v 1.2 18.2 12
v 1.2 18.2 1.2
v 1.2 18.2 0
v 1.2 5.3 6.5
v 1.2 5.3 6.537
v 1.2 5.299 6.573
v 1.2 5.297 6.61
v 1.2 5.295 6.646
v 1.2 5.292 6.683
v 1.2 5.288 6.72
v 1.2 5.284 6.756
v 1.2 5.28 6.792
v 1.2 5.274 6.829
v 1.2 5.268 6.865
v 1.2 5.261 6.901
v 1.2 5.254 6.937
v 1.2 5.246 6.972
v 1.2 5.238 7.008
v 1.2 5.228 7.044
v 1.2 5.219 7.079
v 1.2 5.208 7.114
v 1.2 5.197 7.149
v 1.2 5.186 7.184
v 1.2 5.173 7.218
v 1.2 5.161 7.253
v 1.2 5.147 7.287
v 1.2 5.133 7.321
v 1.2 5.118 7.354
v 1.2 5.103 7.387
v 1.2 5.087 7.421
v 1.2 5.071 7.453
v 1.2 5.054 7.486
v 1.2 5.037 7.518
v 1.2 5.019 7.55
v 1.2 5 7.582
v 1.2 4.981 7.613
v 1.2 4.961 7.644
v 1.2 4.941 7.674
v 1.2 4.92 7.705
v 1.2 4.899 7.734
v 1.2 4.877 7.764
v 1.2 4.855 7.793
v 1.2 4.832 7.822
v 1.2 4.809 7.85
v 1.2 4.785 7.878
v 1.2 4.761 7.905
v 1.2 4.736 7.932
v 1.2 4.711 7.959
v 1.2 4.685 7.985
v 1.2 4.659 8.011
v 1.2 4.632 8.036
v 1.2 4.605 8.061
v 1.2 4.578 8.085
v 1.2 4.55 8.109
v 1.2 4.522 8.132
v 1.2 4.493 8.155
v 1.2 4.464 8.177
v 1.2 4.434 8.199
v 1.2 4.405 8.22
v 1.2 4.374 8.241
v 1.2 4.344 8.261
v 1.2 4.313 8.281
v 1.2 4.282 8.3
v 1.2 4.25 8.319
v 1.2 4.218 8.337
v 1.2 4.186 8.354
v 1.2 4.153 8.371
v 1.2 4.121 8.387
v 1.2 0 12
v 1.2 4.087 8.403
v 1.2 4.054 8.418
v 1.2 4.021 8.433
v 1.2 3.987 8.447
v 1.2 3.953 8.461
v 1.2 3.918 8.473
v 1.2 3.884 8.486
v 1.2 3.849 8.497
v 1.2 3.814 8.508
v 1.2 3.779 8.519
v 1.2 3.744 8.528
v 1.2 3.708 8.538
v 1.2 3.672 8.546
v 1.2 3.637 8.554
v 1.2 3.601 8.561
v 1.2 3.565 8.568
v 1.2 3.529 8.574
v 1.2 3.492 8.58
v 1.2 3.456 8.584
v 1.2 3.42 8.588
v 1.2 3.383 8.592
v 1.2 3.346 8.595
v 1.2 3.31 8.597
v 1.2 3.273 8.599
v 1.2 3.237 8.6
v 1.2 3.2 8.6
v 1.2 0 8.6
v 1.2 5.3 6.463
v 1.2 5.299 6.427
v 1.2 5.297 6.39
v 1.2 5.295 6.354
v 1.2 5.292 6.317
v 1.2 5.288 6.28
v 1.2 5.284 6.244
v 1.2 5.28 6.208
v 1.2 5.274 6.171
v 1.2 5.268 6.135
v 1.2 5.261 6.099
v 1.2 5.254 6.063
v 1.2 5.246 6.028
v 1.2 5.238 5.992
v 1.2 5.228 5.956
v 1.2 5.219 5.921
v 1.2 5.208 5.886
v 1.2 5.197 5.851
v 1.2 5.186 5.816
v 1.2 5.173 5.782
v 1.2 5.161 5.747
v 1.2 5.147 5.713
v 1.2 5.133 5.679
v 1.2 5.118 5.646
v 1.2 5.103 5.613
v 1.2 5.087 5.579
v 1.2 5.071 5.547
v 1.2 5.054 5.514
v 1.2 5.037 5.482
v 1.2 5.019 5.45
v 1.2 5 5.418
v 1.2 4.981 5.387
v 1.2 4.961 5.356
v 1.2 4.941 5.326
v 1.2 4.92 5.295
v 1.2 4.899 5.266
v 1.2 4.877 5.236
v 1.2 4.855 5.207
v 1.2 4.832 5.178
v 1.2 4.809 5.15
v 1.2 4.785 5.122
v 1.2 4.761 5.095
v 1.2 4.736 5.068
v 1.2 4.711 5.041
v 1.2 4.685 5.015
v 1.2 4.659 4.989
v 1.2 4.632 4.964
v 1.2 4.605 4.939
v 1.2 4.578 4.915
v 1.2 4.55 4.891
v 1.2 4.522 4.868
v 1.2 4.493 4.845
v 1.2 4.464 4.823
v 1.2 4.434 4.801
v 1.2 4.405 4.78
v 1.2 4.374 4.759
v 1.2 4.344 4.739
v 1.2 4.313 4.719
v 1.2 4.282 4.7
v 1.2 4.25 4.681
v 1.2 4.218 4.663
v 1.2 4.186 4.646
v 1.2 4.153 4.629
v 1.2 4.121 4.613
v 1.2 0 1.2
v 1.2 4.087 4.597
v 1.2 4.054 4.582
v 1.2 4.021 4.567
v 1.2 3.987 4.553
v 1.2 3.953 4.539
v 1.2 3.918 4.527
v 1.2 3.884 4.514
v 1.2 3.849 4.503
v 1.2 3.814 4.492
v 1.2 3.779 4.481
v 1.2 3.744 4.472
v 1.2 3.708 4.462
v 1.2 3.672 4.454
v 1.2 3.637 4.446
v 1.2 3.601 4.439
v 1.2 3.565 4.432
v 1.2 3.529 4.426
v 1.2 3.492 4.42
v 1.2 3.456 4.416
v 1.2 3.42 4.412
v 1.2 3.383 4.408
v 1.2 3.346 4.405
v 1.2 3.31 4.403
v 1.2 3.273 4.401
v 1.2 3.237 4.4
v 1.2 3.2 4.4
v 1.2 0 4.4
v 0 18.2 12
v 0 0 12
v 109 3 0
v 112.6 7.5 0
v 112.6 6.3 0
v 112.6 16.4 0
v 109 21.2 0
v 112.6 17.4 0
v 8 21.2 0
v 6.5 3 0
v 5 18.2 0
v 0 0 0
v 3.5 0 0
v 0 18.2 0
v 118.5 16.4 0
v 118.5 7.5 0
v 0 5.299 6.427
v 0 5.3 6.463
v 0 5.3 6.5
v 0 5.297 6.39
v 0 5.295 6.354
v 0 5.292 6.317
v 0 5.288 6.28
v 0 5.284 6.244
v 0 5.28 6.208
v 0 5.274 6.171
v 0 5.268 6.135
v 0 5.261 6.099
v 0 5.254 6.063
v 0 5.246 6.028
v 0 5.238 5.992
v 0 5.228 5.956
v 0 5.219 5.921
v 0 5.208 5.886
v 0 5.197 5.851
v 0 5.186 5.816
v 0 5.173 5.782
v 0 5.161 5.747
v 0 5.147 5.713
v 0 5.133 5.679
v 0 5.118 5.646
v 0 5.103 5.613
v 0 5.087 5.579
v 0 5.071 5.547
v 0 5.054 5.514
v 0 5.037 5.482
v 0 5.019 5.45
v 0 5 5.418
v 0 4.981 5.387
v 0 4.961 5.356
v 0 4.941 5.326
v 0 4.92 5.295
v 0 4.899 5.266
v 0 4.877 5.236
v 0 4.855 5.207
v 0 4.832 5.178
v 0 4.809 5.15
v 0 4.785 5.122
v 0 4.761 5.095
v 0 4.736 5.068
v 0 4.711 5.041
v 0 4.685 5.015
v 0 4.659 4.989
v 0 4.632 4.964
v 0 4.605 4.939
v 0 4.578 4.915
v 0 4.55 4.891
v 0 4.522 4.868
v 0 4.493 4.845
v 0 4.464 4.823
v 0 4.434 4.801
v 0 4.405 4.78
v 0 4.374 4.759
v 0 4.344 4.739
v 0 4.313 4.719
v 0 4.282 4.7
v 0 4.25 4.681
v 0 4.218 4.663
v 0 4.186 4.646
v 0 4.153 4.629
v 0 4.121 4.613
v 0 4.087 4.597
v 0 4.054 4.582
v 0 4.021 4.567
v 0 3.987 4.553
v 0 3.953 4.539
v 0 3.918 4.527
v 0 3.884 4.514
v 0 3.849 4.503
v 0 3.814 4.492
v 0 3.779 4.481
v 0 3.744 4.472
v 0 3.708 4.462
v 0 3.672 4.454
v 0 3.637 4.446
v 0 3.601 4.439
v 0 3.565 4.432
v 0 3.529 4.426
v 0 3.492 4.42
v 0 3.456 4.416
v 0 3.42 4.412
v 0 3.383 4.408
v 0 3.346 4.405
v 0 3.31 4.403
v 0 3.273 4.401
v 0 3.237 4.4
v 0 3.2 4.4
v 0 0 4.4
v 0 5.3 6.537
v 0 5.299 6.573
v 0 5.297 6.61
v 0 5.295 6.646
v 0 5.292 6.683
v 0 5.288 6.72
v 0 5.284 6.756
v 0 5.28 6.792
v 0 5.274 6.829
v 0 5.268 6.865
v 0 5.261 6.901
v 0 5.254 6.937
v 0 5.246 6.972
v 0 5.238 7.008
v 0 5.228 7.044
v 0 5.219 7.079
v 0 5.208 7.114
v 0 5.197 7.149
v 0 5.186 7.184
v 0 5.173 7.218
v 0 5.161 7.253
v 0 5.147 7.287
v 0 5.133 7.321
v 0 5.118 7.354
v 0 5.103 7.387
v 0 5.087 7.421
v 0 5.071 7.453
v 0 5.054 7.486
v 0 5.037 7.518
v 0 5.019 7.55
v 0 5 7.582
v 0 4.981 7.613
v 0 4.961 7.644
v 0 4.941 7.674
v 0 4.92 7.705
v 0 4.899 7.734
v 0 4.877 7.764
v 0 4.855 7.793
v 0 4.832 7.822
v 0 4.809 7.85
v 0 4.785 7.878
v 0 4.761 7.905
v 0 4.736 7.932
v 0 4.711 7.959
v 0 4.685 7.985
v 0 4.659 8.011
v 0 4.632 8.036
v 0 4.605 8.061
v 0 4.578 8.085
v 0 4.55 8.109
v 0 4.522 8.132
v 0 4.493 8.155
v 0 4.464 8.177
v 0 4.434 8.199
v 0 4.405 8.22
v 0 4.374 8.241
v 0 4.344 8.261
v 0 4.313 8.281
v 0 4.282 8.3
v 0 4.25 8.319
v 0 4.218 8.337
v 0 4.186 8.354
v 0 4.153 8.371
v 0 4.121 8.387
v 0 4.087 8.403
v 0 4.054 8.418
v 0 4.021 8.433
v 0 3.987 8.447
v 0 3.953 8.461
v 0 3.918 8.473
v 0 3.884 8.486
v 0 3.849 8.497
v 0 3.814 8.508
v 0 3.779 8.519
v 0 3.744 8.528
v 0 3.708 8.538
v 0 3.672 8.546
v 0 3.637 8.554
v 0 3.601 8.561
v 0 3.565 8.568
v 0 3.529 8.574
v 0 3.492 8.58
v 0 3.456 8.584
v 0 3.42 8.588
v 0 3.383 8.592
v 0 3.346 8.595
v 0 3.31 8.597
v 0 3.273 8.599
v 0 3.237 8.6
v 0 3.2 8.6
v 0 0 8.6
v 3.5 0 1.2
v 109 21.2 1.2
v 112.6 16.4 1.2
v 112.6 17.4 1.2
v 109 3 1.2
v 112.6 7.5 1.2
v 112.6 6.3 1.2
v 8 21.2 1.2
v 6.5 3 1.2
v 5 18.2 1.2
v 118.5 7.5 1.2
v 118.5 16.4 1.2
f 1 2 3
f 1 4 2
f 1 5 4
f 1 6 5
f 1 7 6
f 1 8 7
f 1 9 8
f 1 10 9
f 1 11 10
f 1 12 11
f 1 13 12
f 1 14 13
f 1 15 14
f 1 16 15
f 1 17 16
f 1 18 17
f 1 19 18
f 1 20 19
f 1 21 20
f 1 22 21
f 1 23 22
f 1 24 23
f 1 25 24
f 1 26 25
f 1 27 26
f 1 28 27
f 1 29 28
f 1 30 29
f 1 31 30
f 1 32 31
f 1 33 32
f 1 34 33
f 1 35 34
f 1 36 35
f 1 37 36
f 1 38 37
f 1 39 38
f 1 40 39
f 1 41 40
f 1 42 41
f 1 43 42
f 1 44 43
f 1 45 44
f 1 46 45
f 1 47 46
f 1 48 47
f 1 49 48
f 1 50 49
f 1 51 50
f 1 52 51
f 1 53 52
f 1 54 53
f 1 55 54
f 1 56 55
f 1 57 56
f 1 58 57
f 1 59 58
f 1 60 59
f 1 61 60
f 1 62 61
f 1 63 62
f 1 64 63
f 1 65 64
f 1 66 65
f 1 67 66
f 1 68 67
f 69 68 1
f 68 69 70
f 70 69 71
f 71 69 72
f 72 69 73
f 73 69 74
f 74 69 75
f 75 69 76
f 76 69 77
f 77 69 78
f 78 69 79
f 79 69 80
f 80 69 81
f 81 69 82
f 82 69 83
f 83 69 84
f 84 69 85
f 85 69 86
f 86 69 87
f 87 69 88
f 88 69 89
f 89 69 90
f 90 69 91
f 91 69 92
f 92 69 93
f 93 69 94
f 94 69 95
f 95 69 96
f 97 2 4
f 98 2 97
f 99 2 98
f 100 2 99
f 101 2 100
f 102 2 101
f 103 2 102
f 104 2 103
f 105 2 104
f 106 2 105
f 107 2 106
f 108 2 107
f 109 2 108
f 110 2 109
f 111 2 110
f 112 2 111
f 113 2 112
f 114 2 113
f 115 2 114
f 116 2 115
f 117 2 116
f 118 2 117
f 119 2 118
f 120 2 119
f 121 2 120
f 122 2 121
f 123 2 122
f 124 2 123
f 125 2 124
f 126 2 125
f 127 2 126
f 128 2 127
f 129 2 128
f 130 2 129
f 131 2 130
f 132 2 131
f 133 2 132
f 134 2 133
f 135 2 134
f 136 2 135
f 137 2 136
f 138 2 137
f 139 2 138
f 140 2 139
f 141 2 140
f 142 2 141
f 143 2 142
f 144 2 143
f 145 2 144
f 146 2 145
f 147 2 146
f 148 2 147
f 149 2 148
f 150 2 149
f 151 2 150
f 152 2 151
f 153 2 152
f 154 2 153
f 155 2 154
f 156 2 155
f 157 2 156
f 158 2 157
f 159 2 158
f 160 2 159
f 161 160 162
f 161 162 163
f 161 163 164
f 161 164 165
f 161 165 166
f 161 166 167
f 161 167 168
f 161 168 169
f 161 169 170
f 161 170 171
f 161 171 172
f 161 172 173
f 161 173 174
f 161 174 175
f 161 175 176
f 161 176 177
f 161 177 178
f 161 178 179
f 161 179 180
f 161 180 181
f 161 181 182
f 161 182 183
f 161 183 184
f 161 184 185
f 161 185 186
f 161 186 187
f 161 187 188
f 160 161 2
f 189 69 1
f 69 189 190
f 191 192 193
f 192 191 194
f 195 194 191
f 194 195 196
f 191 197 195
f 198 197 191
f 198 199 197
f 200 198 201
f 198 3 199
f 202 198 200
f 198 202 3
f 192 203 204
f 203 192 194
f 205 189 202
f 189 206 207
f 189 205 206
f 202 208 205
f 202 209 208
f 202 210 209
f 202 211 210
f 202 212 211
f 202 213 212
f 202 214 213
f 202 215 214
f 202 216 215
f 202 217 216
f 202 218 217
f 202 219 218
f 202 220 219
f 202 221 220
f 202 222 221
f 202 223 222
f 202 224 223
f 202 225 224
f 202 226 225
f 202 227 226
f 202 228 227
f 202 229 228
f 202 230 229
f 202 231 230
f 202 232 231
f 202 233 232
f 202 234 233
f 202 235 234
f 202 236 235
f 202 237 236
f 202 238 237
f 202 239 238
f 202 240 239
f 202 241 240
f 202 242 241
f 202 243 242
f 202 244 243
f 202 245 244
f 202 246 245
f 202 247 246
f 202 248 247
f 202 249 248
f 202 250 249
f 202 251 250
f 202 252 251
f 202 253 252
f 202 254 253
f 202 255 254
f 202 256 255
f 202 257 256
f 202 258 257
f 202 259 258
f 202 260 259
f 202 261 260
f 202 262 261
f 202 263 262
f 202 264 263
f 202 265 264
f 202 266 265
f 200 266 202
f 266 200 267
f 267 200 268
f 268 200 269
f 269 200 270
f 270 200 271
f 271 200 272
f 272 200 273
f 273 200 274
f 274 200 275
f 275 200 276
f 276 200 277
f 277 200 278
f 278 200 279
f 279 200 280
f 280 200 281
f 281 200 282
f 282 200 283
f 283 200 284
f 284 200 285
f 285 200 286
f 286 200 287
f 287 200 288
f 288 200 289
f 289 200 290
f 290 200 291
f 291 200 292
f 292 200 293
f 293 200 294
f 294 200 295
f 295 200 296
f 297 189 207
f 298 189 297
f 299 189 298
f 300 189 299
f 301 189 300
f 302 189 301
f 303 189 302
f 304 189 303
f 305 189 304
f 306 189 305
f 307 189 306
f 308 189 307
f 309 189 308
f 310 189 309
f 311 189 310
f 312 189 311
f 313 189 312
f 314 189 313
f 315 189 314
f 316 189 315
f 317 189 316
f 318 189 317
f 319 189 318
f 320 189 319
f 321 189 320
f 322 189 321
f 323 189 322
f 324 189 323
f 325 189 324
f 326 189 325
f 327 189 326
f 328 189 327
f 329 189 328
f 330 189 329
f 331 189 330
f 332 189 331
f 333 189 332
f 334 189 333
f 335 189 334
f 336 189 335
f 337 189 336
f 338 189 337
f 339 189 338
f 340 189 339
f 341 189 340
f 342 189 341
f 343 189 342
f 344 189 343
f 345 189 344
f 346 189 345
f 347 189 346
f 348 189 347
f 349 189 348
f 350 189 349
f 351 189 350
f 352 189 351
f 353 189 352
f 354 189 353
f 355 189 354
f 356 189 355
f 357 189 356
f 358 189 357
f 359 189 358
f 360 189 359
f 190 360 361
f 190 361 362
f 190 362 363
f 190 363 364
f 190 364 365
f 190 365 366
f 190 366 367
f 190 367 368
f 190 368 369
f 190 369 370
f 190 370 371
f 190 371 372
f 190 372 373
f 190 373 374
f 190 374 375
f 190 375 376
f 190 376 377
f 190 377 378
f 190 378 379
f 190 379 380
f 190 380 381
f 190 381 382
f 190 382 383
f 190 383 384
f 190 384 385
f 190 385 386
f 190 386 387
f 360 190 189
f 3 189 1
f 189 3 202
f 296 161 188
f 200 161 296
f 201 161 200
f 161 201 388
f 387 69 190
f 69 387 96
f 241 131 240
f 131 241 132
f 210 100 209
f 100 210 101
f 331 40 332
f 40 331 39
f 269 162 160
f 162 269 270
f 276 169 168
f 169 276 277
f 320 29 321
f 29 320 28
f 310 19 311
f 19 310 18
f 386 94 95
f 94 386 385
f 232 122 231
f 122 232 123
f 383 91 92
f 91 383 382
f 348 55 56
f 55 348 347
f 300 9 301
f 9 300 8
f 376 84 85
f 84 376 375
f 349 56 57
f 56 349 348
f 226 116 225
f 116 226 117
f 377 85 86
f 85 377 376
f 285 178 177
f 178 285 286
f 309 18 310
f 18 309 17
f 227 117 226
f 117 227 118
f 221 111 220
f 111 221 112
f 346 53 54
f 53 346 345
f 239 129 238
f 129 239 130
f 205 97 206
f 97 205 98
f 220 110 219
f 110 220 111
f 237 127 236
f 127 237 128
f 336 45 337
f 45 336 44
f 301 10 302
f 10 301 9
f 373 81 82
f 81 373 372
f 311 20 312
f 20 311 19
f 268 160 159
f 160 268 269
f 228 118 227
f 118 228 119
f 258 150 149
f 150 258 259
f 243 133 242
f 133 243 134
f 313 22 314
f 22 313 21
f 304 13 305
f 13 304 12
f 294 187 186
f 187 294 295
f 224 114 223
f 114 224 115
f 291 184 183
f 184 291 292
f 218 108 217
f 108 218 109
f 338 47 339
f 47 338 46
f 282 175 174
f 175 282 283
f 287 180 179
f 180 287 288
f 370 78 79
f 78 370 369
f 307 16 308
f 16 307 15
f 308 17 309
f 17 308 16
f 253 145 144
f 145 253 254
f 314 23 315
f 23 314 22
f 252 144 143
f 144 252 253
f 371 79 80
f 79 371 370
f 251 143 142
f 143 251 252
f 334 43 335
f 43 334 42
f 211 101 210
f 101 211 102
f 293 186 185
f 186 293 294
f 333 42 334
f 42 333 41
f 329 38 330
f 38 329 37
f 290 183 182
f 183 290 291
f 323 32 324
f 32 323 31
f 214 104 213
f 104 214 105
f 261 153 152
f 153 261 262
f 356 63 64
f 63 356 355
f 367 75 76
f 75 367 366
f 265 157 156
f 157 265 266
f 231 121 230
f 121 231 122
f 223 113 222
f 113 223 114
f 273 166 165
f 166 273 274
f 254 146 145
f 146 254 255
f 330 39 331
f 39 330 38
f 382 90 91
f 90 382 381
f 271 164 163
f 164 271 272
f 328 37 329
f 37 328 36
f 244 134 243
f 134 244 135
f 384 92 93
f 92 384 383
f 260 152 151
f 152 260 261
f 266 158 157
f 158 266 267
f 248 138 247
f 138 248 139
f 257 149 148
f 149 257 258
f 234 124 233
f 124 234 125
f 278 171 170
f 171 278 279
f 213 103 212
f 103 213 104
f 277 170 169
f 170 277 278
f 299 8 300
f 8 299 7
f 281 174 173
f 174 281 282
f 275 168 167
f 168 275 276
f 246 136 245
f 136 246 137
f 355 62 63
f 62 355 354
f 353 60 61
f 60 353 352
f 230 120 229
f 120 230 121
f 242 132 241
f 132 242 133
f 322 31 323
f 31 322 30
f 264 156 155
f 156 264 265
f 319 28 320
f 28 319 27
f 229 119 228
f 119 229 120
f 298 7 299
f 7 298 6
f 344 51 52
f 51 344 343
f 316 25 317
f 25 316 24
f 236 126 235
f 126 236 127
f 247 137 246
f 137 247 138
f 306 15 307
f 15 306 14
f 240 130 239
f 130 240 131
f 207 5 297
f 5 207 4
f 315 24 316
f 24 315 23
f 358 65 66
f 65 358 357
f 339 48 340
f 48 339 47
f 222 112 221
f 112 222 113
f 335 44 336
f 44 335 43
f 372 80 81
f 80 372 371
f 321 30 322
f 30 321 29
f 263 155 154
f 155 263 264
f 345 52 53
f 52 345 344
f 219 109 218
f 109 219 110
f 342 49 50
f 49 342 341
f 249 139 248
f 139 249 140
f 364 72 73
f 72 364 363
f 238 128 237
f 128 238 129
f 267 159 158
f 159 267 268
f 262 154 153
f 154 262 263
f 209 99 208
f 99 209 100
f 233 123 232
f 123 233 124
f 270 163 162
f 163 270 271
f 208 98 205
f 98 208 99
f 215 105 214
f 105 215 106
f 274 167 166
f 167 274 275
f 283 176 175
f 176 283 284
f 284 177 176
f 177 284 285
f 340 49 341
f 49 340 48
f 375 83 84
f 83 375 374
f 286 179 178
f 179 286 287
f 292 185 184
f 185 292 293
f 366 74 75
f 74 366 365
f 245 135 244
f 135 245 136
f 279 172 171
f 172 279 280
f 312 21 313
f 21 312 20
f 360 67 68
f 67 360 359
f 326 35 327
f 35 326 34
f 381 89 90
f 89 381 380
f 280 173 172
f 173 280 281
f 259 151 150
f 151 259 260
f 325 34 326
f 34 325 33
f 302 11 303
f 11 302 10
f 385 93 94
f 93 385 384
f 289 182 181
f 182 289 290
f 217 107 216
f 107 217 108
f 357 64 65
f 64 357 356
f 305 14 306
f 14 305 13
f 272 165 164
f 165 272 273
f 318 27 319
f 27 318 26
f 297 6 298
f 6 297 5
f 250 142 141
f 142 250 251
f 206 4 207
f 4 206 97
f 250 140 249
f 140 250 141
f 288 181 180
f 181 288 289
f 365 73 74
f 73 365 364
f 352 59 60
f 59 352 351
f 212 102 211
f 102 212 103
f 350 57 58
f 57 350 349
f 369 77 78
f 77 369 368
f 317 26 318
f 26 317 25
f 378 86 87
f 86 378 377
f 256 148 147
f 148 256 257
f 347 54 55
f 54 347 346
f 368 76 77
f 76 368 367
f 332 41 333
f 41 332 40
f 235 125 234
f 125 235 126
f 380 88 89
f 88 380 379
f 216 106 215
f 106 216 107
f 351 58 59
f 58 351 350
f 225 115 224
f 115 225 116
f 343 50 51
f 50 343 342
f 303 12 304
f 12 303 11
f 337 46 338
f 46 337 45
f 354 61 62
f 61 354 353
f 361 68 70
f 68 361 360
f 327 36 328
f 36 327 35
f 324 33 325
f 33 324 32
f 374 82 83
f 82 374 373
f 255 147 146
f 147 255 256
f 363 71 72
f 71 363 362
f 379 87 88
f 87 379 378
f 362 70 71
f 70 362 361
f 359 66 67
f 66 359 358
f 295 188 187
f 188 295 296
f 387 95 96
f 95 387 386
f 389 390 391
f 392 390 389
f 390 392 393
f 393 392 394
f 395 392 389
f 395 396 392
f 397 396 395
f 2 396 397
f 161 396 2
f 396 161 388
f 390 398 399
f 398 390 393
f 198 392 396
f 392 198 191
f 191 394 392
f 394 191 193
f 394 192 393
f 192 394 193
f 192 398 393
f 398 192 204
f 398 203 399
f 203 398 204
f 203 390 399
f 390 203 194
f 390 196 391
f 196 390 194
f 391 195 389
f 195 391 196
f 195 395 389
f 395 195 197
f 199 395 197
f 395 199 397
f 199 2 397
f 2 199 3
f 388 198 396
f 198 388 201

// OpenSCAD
$fn=360;
module pci_bracket() {
    linear_extrude(1.2) {
        polygon([[0,0],[3.5,0],[6.5,3],[109,3],[112.6,6.3],[112.6,7.5],[118.5,7.5],[118.5,16.4],[112.6,16.4],[112.6,17.4],[109,21.2],[8,21.2],[5,18.2],[0,18.2]]);
    }
    difference() {
        cube([1.2,18.2,12]);
        translate([0,3.2,6.5]) rotate([0,90,0]) cylinder(h=1.2,d=4.2);
        translate([0,0,6.5+4.2/2]) rotate([0,90,0]) cube([4.2,3.2,1.2]);
    }
}

difference() {
    pci_bracket();
    //translate([50,12.2,0]) cylinder(h=1.2,d=7);
    //translate([75,12.2,0]) cylinder(h=1.2,d=7);
}
